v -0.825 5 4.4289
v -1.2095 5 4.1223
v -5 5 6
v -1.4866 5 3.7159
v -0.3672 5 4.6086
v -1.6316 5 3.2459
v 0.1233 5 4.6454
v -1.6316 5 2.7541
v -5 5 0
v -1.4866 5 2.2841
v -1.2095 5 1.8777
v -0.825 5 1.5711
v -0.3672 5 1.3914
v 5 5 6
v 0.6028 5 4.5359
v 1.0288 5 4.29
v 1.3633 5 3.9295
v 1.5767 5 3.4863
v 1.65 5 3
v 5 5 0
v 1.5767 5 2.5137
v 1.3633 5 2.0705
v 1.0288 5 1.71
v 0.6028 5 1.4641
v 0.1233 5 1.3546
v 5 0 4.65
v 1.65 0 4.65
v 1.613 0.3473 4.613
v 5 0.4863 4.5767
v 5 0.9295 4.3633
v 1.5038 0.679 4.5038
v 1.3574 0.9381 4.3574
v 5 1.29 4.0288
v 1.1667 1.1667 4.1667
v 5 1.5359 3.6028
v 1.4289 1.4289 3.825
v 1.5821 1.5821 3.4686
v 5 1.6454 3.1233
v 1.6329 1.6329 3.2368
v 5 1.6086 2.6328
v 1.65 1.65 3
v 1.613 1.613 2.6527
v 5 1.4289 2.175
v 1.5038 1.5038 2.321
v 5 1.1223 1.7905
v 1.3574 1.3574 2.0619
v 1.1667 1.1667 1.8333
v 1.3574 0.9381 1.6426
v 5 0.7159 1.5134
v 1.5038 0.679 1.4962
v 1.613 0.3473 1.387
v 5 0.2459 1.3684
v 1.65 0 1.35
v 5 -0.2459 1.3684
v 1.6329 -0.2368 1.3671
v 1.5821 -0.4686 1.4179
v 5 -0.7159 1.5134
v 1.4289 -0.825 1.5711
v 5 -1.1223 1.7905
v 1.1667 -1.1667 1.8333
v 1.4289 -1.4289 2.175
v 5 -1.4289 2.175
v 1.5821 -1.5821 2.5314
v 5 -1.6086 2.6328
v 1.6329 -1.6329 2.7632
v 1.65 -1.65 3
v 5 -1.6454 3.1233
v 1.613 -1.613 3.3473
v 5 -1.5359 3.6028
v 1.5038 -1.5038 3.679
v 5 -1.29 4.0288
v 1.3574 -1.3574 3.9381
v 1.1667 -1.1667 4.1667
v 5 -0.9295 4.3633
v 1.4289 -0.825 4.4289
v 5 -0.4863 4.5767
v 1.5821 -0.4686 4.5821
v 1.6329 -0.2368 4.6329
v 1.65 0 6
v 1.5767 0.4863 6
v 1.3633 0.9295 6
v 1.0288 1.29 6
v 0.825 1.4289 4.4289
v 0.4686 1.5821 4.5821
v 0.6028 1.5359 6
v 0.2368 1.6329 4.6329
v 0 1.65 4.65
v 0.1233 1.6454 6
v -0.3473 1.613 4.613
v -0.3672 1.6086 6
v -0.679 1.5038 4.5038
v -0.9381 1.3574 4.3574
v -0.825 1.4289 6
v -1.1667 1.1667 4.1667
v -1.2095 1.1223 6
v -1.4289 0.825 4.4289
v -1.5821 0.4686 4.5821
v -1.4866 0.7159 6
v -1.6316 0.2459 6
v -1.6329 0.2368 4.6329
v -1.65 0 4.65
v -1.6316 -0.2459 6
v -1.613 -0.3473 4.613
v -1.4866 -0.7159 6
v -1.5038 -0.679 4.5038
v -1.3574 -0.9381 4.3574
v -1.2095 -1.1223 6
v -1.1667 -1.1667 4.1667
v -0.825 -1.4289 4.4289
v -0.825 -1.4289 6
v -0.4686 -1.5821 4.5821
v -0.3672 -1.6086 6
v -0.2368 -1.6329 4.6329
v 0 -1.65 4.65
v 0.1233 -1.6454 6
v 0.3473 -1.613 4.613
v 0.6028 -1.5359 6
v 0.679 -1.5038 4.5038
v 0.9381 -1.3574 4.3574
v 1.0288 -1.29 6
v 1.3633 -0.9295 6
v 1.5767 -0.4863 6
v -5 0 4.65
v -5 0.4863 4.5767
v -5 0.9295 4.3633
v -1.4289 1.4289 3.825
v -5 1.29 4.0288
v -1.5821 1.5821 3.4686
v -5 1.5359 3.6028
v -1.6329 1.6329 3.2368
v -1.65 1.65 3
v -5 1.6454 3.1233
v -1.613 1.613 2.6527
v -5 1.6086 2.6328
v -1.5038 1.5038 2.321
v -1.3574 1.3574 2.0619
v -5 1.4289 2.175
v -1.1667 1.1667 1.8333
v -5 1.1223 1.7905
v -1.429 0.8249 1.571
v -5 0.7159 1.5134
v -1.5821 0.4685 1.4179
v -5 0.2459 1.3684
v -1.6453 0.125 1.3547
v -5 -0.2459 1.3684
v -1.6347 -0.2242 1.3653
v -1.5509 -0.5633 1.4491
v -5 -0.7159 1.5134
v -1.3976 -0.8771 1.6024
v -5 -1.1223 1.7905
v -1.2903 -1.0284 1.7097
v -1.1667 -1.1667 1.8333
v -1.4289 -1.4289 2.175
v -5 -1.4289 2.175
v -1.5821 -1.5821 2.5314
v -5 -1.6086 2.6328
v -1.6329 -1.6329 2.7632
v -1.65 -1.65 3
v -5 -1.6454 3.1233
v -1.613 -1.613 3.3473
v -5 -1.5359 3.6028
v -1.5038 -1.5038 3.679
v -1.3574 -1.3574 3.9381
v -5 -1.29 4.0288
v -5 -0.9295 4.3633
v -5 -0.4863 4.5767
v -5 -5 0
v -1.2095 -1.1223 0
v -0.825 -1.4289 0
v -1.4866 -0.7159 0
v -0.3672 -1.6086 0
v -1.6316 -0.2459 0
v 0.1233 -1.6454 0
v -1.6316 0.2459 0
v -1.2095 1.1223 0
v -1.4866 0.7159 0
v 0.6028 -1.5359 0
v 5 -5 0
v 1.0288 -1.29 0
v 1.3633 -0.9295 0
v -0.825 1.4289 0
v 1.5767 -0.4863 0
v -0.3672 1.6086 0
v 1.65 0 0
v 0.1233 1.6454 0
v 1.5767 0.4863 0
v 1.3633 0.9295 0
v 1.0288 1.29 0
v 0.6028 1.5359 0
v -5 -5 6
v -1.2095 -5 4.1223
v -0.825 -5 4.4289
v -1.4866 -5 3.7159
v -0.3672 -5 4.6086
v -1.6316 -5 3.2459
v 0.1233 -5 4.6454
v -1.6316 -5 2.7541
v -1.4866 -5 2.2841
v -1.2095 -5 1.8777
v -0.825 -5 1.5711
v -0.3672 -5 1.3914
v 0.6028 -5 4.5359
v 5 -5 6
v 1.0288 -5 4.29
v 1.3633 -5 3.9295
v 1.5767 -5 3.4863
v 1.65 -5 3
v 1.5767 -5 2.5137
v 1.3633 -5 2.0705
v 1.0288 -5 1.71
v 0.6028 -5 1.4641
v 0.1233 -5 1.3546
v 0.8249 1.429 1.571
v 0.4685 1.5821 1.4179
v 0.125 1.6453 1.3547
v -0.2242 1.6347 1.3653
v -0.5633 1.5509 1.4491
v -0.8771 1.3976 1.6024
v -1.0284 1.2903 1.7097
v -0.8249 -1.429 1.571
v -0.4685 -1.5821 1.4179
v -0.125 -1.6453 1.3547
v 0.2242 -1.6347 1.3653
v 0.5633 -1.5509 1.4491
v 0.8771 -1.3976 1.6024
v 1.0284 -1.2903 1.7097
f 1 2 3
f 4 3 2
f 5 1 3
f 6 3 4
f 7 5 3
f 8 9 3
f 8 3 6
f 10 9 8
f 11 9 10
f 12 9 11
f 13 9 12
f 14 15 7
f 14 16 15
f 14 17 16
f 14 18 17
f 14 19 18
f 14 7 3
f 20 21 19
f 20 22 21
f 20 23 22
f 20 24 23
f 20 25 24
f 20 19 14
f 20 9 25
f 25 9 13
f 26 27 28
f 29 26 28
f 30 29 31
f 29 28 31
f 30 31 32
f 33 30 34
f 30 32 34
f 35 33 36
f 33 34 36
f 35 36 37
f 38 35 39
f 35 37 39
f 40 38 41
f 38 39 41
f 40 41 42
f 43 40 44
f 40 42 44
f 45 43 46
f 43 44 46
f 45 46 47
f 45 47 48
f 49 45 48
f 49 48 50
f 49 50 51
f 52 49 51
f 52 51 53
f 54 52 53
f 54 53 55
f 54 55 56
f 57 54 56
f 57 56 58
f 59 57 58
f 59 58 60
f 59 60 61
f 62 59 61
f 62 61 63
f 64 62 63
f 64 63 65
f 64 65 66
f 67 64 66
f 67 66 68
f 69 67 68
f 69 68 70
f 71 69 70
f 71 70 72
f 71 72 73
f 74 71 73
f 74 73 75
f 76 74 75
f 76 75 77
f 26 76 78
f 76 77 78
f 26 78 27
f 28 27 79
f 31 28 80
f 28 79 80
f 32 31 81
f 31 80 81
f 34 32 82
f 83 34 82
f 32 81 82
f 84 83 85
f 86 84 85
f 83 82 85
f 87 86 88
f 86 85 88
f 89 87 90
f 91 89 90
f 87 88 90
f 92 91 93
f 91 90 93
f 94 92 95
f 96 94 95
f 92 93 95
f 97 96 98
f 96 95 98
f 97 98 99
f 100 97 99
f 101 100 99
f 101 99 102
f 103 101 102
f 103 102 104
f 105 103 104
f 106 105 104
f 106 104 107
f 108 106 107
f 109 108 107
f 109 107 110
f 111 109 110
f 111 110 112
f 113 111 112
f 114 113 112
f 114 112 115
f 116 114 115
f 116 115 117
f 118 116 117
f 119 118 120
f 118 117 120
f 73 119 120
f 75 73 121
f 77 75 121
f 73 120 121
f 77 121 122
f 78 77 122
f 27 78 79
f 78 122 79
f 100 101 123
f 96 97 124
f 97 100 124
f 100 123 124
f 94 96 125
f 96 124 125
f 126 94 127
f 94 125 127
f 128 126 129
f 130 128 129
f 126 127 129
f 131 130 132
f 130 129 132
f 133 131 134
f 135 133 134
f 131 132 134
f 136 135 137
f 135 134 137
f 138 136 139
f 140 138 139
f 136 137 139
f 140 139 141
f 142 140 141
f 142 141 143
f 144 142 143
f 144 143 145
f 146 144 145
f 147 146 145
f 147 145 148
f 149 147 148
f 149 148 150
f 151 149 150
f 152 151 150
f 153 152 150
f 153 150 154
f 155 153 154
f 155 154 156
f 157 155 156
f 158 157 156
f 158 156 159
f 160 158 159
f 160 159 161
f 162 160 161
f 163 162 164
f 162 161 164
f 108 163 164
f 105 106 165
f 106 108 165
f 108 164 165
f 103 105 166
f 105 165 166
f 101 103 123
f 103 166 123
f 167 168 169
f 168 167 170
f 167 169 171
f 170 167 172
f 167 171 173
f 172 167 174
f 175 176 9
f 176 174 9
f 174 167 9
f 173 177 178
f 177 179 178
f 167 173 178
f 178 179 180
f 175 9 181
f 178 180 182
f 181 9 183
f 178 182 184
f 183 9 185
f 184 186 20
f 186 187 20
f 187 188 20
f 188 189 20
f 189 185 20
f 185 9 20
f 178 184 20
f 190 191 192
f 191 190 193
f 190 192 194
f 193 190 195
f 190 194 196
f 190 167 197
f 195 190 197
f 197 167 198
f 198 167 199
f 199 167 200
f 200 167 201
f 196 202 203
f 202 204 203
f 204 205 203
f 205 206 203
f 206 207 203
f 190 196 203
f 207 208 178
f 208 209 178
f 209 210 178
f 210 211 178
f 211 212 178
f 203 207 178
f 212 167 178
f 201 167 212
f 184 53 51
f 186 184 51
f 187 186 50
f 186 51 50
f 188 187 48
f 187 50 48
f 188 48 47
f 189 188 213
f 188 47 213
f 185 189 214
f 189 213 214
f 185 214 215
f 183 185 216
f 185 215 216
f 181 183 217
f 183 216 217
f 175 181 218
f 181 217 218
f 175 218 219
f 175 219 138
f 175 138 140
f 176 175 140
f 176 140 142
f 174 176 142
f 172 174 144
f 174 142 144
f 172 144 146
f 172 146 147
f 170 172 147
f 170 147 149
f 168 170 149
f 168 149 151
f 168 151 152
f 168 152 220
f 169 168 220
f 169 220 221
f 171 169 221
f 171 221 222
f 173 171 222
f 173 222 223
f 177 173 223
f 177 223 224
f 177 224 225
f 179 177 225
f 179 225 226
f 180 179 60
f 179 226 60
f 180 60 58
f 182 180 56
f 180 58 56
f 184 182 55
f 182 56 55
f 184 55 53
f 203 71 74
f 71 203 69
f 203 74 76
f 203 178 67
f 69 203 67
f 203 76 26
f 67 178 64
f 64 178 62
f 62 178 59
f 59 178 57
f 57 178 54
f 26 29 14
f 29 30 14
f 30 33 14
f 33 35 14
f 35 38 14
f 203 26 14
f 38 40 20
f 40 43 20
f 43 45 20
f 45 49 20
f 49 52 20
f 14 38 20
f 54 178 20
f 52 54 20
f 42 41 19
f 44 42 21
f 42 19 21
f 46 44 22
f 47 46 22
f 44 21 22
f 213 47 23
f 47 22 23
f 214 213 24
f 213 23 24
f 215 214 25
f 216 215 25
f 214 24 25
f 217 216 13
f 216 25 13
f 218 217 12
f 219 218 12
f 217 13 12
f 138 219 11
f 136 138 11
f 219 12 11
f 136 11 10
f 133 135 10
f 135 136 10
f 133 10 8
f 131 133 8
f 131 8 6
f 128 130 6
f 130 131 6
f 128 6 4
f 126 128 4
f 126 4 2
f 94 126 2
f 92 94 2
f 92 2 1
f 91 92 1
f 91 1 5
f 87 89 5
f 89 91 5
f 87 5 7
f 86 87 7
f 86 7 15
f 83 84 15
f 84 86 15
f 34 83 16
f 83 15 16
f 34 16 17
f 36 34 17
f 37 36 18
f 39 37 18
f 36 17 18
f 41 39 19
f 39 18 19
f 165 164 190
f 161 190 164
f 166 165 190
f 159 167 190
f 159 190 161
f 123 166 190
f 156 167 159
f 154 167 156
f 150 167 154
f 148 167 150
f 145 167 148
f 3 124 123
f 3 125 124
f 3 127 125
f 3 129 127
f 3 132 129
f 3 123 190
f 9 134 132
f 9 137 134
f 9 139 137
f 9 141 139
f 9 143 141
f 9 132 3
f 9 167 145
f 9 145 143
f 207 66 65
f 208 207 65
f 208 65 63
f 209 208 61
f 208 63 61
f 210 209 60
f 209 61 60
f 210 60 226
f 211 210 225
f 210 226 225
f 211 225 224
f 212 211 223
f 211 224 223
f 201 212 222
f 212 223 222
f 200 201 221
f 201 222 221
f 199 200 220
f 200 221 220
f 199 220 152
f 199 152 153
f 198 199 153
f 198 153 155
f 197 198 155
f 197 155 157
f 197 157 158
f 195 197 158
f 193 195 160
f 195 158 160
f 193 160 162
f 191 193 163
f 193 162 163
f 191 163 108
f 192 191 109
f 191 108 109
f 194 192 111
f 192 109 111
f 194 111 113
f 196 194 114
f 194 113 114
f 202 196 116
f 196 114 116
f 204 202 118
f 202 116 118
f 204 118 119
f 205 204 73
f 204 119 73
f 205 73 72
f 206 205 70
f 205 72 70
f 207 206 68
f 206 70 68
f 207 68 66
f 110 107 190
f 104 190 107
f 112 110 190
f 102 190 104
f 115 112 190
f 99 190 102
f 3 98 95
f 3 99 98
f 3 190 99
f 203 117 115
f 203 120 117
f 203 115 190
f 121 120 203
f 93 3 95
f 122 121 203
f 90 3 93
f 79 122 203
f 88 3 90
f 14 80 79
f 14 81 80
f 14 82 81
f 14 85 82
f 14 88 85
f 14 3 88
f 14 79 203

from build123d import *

# Parameters (mm, degrees)
SKETCH_1_W               = 10
SKETCH_1_H               = 10
EXTRUDE_1_DEPTH          = 6
SKETCH_2_R               = 1.65
CUT_EXTRUDE_1_DEPTH      = 6
SKETCH_3_R               = 1.65
CUT_EXTRUDE_2_DEPTH      = 1
CUT_EXTRUDE_2_DEPTH_BACK = 11
SKETCH_4_R               = 1.65
CUT_EXTRUDE_3_DEPTH      = 11


with BuildPart() as part:
    # 草图1 → 凸台-拉伸1 (new body)
    with BuildSketch(Plane.XY):
        Rectangle(SKETCH_1_W, SKETCH_1_H)
    extrude(amount=EXTRUDE_1_DEPTH)

    # 草图2 → 切除-拉伸1 (cut)
    with BuildSketch(Plane.XY.offset(6)):
        Circle(SKETCH_2_R)
    extrude(amount=-CUT_EXTRUDE_1_DEPTH, mode=Mode.SUBTRACT)

    # 草图3 → 切除-拉伸2 (cut, two sides)
    with BuildSketch(Plane.ZY.offset(5)) as cut_extrude_2_sk:
        with Locations((3, 0)):
            Circle(SKETCH_3_R)
    extrude(amount=CUT_EXTRUDE_2_DEPTH, mode=Mode.SUBTRACT)
    extrude(cut_extrude_2_sk.sketch, amount=-CUT_EXTRUDE_2_DEPTH_BACK, mode=Mode.SUBTRACT)

    # 草图4 → 切除-拉伸3 (cut, through all)
    with BuildSketch(Plane(origin=(0, 5, 0), x_dir=(1, 0, 0), z_dir=(0, 1, 0))):
        with Locations((0, -3)):
            Circle(SKETCH_4_R)
    extrude(amount=-CUT_EXTRUDE_3_DEPTH, mode=Mode.SUBTRACT)


solid = part.part
